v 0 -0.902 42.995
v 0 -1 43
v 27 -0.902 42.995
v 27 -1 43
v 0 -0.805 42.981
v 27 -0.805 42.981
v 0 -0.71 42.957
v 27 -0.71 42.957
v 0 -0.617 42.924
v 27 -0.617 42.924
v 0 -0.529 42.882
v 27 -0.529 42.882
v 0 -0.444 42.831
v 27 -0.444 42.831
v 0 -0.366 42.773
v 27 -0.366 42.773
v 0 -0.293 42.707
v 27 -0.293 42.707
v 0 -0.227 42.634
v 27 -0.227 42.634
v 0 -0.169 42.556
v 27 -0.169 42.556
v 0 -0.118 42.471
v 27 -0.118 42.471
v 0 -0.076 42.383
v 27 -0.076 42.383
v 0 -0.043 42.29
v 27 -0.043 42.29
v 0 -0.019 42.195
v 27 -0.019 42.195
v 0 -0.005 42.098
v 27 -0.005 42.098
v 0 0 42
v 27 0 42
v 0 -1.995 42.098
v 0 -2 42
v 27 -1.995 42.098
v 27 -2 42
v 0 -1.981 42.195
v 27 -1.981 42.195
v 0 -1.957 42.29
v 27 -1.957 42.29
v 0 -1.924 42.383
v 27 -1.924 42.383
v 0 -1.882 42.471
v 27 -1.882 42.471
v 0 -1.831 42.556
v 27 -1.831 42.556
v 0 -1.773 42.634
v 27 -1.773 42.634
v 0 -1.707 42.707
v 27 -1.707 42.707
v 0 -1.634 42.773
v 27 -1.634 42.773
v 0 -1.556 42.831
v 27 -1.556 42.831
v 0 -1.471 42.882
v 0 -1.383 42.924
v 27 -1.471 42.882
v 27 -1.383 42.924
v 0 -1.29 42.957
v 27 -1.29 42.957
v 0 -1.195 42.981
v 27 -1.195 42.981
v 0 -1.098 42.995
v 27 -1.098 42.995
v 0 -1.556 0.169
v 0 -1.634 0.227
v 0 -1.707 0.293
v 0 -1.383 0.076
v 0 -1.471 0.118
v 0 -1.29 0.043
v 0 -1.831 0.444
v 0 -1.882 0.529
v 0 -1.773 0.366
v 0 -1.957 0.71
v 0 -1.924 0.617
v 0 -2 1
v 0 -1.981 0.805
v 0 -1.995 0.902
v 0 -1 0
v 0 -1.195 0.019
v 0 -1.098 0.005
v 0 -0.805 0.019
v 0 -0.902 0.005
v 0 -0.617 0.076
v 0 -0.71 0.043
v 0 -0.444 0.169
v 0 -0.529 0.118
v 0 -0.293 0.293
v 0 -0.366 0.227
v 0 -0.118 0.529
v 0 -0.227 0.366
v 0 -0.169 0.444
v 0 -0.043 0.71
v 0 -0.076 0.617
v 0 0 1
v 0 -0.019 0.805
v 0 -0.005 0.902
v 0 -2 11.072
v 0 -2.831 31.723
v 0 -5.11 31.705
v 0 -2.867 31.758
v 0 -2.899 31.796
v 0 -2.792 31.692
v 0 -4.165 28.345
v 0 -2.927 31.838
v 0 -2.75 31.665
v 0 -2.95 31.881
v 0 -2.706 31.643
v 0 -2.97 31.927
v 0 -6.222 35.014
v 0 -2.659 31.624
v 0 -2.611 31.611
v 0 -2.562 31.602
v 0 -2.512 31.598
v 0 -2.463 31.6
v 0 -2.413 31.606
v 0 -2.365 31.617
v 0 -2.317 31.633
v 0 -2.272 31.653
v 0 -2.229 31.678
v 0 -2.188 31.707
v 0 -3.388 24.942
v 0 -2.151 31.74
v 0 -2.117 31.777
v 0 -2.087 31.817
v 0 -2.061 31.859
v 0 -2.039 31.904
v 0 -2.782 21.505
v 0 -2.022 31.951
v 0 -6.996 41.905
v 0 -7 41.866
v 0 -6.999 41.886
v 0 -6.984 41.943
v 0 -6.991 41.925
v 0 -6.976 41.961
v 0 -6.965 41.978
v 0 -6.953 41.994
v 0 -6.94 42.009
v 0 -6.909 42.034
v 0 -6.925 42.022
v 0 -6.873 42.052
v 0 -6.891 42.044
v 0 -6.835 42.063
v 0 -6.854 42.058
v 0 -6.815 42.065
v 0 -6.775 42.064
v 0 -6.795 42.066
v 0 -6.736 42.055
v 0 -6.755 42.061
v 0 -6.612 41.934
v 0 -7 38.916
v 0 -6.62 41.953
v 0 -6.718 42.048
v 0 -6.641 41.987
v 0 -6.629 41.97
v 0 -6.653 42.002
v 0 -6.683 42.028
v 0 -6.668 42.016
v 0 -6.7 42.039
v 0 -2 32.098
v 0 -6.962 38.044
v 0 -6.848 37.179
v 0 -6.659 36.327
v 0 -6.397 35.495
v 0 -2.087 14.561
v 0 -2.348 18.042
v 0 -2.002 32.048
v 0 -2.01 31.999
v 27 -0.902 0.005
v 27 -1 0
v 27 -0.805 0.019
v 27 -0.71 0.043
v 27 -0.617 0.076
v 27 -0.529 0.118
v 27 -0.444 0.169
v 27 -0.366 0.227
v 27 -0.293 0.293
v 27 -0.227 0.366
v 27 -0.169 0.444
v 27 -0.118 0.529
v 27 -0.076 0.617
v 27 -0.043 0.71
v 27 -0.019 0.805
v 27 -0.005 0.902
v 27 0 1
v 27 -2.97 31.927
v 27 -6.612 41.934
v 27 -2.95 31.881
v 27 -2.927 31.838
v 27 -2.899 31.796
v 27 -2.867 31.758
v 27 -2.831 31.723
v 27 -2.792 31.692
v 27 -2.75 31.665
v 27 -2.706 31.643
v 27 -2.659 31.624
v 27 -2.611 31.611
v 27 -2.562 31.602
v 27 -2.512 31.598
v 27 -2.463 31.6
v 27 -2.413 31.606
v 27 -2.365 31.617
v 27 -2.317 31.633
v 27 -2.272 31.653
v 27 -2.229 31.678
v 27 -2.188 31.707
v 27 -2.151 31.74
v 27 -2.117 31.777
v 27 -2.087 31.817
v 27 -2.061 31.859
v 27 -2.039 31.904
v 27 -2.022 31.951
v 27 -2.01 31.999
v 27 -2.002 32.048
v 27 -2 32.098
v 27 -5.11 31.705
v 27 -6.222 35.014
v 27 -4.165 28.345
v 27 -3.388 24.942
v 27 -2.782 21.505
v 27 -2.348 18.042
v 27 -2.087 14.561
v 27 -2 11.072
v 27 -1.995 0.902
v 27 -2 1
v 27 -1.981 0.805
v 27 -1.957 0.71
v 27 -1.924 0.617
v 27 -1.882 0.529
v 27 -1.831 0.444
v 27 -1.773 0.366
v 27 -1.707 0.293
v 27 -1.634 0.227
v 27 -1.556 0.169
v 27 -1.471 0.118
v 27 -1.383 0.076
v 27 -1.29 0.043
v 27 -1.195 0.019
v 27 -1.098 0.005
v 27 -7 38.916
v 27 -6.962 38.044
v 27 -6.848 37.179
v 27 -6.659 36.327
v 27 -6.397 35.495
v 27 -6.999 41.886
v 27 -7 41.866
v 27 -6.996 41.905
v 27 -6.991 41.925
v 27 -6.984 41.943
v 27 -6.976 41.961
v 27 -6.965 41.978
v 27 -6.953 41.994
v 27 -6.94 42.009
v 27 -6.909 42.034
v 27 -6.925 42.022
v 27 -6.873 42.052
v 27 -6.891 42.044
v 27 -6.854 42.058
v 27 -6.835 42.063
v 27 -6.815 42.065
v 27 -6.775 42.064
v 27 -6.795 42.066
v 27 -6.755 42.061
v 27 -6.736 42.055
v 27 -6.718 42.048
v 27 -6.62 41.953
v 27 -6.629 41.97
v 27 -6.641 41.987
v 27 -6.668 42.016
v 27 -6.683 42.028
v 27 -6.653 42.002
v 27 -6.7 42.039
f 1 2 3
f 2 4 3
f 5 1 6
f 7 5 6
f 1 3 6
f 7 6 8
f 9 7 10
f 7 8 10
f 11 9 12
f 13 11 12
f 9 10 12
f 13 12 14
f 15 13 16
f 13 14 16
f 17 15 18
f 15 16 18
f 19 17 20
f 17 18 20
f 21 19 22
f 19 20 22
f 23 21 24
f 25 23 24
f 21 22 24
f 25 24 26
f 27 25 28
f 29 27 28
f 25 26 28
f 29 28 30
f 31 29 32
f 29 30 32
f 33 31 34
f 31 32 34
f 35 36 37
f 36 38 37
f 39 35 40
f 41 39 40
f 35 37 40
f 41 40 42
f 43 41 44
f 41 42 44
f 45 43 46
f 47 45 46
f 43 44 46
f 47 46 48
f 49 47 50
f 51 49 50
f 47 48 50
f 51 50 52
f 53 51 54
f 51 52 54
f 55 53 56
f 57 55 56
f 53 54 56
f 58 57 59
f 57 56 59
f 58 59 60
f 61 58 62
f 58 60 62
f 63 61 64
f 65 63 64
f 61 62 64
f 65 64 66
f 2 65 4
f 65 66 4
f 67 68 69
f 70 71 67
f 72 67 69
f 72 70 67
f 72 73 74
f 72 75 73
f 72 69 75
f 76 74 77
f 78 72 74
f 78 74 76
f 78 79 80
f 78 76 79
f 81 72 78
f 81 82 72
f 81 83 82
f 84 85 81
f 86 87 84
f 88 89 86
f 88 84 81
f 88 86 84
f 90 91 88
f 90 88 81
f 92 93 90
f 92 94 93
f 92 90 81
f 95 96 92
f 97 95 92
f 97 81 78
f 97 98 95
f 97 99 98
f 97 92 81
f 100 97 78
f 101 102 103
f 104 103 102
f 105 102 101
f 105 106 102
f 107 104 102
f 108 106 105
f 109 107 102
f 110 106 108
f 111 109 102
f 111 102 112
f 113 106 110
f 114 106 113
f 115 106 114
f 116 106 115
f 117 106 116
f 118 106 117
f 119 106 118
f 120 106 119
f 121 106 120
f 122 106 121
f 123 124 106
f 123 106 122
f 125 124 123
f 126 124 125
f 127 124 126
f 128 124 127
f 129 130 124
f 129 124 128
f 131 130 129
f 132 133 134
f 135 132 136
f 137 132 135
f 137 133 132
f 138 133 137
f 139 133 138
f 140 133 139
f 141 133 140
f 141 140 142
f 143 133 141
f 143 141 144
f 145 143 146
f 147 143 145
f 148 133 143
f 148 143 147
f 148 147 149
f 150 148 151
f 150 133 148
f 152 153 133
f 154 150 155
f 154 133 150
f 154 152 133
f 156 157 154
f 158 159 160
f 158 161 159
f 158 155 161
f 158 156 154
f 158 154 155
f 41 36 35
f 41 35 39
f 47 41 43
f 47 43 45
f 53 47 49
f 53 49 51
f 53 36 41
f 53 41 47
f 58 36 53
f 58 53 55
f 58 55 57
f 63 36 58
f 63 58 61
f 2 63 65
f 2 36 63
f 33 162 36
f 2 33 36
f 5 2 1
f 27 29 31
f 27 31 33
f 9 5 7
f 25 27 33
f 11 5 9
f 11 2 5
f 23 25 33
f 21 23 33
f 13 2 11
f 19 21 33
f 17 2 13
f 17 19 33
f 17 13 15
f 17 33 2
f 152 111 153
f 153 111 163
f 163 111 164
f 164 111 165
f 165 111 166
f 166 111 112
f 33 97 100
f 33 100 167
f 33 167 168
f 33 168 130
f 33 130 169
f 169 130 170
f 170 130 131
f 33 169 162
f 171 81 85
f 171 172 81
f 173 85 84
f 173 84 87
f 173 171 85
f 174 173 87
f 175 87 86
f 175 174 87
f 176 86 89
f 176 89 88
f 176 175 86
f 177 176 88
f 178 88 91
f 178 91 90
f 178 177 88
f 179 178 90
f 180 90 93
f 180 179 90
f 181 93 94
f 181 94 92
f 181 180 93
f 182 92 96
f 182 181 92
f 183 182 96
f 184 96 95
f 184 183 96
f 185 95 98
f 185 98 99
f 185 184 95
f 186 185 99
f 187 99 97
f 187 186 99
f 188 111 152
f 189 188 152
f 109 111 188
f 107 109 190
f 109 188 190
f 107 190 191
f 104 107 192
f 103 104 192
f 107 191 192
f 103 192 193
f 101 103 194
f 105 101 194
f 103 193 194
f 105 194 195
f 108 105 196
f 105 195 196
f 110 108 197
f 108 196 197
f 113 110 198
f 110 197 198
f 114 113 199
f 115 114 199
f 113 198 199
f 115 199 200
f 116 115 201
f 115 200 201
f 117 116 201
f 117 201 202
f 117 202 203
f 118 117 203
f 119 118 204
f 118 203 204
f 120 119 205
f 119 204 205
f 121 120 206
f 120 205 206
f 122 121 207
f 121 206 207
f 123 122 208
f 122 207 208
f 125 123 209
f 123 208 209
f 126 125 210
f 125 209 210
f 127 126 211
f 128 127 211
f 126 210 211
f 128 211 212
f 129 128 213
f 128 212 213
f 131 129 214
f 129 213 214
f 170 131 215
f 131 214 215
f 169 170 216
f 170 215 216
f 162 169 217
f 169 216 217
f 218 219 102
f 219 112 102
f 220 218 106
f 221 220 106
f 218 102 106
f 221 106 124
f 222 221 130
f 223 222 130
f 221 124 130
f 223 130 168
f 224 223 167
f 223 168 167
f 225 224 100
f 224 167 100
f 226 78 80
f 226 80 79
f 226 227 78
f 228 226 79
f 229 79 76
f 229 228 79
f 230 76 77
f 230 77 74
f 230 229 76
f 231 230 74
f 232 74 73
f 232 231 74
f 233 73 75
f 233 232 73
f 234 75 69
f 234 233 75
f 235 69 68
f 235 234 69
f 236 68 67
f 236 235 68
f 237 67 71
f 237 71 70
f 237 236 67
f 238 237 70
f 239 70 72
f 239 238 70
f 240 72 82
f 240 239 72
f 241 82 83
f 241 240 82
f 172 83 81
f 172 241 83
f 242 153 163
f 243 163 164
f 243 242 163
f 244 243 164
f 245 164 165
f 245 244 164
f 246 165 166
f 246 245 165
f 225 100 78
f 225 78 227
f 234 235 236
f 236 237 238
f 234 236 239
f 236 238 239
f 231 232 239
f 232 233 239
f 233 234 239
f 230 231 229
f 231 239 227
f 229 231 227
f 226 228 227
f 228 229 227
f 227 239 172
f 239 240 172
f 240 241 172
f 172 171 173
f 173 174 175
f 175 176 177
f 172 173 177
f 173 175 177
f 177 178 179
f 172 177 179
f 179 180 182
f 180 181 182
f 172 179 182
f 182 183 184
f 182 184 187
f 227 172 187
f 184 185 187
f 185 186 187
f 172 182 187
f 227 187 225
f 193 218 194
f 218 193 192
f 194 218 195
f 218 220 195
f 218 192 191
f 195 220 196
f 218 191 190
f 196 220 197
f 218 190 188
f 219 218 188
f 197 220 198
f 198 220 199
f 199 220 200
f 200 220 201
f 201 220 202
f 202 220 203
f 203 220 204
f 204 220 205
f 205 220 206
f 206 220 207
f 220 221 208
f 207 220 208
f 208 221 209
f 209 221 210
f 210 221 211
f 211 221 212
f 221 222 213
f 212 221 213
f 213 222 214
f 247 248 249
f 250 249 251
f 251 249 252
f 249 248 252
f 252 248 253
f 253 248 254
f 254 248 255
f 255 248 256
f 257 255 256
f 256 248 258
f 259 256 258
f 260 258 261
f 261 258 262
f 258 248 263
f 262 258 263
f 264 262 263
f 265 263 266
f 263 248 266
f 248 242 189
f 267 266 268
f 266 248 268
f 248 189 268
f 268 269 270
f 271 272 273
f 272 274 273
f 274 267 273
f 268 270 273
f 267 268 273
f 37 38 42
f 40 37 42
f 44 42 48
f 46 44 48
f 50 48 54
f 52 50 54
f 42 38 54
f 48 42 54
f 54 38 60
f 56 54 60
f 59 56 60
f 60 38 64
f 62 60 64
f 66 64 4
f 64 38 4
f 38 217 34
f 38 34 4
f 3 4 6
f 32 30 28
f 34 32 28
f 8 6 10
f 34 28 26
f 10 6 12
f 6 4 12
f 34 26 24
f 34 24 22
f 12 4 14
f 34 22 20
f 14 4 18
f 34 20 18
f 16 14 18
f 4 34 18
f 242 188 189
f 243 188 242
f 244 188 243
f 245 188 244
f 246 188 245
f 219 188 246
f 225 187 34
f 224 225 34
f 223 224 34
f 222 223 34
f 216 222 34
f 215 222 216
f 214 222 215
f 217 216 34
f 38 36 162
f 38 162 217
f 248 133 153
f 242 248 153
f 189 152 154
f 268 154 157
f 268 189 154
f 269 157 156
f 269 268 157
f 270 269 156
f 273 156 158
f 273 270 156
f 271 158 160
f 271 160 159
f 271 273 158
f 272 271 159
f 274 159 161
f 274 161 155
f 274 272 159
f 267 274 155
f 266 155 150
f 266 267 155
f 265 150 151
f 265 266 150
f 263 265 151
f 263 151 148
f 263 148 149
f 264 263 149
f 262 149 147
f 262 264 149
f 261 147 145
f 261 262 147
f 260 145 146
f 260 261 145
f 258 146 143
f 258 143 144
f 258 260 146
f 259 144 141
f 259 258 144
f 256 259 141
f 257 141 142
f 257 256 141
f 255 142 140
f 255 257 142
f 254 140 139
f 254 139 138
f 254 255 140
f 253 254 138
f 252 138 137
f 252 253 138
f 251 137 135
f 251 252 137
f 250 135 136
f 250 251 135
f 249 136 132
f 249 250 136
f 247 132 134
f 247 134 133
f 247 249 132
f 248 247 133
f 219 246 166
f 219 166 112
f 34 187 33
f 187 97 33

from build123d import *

# Parameters (mm, degrees)
F0_W     = 27
F0_H     = 43
F1_DEPTH = 2
F3_DEPTH = 27
F4_R     = 70
F5_R     = 0.5
F6_R     = 10
F7_R     = 0.99999
F8_R     = 0.2


# Not quite as in the source:
# - a fillet or chamfer is up to 0.001 mm smaller than in the source, because OpenCascade refuses the exact size


with BuildPart() as f1:
    # F0 (on Front) → F1 (new body)
    with BuildSketch(Plane.XZ):
        with Locations((13.5, 21.5)):
            Rectangle(F0_W, F0_H)
    extrude(amount=F1_DEPTH)

    # F2 (on Right) → F3 (join, through all)
    with BuildSketch(Plane.YZ):
        Polygon((0, 17.9200492635), (0, 23.7676580638), (-7, 43), (-7, 37.1523911997), align=None)
    extrude(amount=F3_DEPTH)

    # F4
    f4_edges = [f1.edges().sort_by_distance(p)[0] for p in [
        (13.5, -2, 23.415004),
    ]]
    fillet(f4_edges, radius=F4_R)

    # F5
    f5_edges = [f1.edges().sort_by_distance(p)[0] for p in [
        (13.5, -2, 29.262613),
    ]]
    fillet(f5_edges, radius=F5_R)

    # F6
    f6_edges = [f1.edges().sort_by_distance(p)[0] for p in [
        (13.5, -7, 37.152391),
    ]]
    fillet(f6_edges, radius=F6_R)

    # F7 (radius 1 in the source; OpenCascade refuses exactly that, so slightly less here)
    f7_edges = [f1.edges().sort_by_distance(p)[0] for p in [
        (13.5, -2, 43),
        (13.5, 0, 43),
        (13.5, -2, 0),
        (13.5, 0, 0),
    ]]
    fillet(f7_edges, radius=F7_R)

    # F8
    f8_edges = [f1.edges().sort_by_distance(p)[0] for p in [
        (13.5, -7, 43),
    ]]
    fillet(f8_edges, radius=F8_R)


solid = f1.part
